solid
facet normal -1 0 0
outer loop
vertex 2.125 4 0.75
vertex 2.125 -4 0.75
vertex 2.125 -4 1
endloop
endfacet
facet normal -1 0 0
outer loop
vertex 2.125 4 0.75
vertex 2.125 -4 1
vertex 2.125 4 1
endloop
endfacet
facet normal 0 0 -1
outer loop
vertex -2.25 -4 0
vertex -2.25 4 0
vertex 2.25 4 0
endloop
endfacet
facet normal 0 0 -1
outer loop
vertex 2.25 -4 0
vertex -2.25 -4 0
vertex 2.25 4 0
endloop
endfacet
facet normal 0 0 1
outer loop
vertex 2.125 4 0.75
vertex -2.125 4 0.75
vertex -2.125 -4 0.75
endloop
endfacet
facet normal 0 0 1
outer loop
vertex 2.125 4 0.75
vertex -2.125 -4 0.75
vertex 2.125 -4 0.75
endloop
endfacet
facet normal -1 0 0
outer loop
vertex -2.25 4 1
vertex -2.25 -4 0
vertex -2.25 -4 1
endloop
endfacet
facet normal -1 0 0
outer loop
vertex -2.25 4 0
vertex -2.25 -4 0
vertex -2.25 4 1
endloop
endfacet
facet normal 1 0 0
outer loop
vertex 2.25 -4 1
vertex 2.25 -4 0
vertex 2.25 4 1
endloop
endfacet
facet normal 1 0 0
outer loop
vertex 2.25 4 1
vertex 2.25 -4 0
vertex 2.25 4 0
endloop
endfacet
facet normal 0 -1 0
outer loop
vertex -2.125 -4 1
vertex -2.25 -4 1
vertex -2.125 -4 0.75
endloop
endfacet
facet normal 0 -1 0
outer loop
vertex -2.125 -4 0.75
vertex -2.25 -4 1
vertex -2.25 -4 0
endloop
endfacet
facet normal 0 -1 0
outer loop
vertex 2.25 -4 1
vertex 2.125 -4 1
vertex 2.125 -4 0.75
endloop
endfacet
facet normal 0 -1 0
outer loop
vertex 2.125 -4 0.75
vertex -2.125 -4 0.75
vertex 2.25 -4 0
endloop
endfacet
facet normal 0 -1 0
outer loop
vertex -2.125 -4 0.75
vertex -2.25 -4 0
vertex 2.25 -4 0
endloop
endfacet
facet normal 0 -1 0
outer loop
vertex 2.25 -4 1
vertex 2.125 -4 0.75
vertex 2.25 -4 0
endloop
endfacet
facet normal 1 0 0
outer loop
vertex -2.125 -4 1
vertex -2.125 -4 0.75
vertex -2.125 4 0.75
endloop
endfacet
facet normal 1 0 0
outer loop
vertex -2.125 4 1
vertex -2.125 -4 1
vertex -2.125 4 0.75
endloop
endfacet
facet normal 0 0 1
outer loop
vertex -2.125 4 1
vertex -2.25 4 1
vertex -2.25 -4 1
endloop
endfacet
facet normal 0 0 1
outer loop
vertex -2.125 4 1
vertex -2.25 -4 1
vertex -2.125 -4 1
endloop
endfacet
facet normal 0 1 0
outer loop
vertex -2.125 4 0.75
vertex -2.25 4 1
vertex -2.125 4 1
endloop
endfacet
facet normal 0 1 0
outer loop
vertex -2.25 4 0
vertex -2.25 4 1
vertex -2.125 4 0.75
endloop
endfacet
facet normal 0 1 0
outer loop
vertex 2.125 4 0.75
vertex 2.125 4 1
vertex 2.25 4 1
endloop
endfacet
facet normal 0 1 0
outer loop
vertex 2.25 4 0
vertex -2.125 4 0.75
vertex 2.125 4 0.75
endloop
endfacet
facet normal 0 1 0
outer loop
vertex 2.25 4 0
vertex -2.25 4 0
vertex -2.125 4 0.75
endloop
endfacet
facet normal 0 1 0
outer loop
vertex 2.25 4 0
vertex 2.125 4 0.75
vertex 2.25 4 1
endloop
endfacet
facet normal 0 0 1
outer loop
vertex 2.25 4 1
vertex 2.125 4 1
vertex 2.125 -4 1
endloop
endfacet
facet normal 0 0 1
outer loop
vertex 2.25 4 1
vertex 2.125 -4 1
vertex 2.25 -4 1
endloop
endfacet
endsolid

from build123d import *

# Parameters (mm, degrees)
SKETCH1_W           = 4.25
SKETCH1_H           = 8
BOSS_EXTRUDE1_DEPTH = 0.75
SKETCH1_3_W         = 0.125
SKETCH1_3_H         = 8
BOSS_EXTRUDE2_DEPTH = 1


with BuildPart() as part:
    # Sketch1 → Boss-Extrude1 (new body)
    with BuildSketch(Plane.XY):
        Rectangle(SKETCH1_W, SKETCH1_H)
    extrude(amount=BOSS_EXTRUDE1_DEPTH)

    # Sketch1<3> → Boss-Extrude2 (add)
    with BuildSketch(Plane.XY):
        with Locations((2.1875, 0)):
            Rectangle(SKETCH1_3_W, SKETCH1_3_H)
        with Locations((-2.1875, 0)):
            Rectangle(SKETCH1_3_W, SKETCH1_3_H)
    extrude(amount=BOSS_EXTRUDE2_DEPTH)


solid = part.part
